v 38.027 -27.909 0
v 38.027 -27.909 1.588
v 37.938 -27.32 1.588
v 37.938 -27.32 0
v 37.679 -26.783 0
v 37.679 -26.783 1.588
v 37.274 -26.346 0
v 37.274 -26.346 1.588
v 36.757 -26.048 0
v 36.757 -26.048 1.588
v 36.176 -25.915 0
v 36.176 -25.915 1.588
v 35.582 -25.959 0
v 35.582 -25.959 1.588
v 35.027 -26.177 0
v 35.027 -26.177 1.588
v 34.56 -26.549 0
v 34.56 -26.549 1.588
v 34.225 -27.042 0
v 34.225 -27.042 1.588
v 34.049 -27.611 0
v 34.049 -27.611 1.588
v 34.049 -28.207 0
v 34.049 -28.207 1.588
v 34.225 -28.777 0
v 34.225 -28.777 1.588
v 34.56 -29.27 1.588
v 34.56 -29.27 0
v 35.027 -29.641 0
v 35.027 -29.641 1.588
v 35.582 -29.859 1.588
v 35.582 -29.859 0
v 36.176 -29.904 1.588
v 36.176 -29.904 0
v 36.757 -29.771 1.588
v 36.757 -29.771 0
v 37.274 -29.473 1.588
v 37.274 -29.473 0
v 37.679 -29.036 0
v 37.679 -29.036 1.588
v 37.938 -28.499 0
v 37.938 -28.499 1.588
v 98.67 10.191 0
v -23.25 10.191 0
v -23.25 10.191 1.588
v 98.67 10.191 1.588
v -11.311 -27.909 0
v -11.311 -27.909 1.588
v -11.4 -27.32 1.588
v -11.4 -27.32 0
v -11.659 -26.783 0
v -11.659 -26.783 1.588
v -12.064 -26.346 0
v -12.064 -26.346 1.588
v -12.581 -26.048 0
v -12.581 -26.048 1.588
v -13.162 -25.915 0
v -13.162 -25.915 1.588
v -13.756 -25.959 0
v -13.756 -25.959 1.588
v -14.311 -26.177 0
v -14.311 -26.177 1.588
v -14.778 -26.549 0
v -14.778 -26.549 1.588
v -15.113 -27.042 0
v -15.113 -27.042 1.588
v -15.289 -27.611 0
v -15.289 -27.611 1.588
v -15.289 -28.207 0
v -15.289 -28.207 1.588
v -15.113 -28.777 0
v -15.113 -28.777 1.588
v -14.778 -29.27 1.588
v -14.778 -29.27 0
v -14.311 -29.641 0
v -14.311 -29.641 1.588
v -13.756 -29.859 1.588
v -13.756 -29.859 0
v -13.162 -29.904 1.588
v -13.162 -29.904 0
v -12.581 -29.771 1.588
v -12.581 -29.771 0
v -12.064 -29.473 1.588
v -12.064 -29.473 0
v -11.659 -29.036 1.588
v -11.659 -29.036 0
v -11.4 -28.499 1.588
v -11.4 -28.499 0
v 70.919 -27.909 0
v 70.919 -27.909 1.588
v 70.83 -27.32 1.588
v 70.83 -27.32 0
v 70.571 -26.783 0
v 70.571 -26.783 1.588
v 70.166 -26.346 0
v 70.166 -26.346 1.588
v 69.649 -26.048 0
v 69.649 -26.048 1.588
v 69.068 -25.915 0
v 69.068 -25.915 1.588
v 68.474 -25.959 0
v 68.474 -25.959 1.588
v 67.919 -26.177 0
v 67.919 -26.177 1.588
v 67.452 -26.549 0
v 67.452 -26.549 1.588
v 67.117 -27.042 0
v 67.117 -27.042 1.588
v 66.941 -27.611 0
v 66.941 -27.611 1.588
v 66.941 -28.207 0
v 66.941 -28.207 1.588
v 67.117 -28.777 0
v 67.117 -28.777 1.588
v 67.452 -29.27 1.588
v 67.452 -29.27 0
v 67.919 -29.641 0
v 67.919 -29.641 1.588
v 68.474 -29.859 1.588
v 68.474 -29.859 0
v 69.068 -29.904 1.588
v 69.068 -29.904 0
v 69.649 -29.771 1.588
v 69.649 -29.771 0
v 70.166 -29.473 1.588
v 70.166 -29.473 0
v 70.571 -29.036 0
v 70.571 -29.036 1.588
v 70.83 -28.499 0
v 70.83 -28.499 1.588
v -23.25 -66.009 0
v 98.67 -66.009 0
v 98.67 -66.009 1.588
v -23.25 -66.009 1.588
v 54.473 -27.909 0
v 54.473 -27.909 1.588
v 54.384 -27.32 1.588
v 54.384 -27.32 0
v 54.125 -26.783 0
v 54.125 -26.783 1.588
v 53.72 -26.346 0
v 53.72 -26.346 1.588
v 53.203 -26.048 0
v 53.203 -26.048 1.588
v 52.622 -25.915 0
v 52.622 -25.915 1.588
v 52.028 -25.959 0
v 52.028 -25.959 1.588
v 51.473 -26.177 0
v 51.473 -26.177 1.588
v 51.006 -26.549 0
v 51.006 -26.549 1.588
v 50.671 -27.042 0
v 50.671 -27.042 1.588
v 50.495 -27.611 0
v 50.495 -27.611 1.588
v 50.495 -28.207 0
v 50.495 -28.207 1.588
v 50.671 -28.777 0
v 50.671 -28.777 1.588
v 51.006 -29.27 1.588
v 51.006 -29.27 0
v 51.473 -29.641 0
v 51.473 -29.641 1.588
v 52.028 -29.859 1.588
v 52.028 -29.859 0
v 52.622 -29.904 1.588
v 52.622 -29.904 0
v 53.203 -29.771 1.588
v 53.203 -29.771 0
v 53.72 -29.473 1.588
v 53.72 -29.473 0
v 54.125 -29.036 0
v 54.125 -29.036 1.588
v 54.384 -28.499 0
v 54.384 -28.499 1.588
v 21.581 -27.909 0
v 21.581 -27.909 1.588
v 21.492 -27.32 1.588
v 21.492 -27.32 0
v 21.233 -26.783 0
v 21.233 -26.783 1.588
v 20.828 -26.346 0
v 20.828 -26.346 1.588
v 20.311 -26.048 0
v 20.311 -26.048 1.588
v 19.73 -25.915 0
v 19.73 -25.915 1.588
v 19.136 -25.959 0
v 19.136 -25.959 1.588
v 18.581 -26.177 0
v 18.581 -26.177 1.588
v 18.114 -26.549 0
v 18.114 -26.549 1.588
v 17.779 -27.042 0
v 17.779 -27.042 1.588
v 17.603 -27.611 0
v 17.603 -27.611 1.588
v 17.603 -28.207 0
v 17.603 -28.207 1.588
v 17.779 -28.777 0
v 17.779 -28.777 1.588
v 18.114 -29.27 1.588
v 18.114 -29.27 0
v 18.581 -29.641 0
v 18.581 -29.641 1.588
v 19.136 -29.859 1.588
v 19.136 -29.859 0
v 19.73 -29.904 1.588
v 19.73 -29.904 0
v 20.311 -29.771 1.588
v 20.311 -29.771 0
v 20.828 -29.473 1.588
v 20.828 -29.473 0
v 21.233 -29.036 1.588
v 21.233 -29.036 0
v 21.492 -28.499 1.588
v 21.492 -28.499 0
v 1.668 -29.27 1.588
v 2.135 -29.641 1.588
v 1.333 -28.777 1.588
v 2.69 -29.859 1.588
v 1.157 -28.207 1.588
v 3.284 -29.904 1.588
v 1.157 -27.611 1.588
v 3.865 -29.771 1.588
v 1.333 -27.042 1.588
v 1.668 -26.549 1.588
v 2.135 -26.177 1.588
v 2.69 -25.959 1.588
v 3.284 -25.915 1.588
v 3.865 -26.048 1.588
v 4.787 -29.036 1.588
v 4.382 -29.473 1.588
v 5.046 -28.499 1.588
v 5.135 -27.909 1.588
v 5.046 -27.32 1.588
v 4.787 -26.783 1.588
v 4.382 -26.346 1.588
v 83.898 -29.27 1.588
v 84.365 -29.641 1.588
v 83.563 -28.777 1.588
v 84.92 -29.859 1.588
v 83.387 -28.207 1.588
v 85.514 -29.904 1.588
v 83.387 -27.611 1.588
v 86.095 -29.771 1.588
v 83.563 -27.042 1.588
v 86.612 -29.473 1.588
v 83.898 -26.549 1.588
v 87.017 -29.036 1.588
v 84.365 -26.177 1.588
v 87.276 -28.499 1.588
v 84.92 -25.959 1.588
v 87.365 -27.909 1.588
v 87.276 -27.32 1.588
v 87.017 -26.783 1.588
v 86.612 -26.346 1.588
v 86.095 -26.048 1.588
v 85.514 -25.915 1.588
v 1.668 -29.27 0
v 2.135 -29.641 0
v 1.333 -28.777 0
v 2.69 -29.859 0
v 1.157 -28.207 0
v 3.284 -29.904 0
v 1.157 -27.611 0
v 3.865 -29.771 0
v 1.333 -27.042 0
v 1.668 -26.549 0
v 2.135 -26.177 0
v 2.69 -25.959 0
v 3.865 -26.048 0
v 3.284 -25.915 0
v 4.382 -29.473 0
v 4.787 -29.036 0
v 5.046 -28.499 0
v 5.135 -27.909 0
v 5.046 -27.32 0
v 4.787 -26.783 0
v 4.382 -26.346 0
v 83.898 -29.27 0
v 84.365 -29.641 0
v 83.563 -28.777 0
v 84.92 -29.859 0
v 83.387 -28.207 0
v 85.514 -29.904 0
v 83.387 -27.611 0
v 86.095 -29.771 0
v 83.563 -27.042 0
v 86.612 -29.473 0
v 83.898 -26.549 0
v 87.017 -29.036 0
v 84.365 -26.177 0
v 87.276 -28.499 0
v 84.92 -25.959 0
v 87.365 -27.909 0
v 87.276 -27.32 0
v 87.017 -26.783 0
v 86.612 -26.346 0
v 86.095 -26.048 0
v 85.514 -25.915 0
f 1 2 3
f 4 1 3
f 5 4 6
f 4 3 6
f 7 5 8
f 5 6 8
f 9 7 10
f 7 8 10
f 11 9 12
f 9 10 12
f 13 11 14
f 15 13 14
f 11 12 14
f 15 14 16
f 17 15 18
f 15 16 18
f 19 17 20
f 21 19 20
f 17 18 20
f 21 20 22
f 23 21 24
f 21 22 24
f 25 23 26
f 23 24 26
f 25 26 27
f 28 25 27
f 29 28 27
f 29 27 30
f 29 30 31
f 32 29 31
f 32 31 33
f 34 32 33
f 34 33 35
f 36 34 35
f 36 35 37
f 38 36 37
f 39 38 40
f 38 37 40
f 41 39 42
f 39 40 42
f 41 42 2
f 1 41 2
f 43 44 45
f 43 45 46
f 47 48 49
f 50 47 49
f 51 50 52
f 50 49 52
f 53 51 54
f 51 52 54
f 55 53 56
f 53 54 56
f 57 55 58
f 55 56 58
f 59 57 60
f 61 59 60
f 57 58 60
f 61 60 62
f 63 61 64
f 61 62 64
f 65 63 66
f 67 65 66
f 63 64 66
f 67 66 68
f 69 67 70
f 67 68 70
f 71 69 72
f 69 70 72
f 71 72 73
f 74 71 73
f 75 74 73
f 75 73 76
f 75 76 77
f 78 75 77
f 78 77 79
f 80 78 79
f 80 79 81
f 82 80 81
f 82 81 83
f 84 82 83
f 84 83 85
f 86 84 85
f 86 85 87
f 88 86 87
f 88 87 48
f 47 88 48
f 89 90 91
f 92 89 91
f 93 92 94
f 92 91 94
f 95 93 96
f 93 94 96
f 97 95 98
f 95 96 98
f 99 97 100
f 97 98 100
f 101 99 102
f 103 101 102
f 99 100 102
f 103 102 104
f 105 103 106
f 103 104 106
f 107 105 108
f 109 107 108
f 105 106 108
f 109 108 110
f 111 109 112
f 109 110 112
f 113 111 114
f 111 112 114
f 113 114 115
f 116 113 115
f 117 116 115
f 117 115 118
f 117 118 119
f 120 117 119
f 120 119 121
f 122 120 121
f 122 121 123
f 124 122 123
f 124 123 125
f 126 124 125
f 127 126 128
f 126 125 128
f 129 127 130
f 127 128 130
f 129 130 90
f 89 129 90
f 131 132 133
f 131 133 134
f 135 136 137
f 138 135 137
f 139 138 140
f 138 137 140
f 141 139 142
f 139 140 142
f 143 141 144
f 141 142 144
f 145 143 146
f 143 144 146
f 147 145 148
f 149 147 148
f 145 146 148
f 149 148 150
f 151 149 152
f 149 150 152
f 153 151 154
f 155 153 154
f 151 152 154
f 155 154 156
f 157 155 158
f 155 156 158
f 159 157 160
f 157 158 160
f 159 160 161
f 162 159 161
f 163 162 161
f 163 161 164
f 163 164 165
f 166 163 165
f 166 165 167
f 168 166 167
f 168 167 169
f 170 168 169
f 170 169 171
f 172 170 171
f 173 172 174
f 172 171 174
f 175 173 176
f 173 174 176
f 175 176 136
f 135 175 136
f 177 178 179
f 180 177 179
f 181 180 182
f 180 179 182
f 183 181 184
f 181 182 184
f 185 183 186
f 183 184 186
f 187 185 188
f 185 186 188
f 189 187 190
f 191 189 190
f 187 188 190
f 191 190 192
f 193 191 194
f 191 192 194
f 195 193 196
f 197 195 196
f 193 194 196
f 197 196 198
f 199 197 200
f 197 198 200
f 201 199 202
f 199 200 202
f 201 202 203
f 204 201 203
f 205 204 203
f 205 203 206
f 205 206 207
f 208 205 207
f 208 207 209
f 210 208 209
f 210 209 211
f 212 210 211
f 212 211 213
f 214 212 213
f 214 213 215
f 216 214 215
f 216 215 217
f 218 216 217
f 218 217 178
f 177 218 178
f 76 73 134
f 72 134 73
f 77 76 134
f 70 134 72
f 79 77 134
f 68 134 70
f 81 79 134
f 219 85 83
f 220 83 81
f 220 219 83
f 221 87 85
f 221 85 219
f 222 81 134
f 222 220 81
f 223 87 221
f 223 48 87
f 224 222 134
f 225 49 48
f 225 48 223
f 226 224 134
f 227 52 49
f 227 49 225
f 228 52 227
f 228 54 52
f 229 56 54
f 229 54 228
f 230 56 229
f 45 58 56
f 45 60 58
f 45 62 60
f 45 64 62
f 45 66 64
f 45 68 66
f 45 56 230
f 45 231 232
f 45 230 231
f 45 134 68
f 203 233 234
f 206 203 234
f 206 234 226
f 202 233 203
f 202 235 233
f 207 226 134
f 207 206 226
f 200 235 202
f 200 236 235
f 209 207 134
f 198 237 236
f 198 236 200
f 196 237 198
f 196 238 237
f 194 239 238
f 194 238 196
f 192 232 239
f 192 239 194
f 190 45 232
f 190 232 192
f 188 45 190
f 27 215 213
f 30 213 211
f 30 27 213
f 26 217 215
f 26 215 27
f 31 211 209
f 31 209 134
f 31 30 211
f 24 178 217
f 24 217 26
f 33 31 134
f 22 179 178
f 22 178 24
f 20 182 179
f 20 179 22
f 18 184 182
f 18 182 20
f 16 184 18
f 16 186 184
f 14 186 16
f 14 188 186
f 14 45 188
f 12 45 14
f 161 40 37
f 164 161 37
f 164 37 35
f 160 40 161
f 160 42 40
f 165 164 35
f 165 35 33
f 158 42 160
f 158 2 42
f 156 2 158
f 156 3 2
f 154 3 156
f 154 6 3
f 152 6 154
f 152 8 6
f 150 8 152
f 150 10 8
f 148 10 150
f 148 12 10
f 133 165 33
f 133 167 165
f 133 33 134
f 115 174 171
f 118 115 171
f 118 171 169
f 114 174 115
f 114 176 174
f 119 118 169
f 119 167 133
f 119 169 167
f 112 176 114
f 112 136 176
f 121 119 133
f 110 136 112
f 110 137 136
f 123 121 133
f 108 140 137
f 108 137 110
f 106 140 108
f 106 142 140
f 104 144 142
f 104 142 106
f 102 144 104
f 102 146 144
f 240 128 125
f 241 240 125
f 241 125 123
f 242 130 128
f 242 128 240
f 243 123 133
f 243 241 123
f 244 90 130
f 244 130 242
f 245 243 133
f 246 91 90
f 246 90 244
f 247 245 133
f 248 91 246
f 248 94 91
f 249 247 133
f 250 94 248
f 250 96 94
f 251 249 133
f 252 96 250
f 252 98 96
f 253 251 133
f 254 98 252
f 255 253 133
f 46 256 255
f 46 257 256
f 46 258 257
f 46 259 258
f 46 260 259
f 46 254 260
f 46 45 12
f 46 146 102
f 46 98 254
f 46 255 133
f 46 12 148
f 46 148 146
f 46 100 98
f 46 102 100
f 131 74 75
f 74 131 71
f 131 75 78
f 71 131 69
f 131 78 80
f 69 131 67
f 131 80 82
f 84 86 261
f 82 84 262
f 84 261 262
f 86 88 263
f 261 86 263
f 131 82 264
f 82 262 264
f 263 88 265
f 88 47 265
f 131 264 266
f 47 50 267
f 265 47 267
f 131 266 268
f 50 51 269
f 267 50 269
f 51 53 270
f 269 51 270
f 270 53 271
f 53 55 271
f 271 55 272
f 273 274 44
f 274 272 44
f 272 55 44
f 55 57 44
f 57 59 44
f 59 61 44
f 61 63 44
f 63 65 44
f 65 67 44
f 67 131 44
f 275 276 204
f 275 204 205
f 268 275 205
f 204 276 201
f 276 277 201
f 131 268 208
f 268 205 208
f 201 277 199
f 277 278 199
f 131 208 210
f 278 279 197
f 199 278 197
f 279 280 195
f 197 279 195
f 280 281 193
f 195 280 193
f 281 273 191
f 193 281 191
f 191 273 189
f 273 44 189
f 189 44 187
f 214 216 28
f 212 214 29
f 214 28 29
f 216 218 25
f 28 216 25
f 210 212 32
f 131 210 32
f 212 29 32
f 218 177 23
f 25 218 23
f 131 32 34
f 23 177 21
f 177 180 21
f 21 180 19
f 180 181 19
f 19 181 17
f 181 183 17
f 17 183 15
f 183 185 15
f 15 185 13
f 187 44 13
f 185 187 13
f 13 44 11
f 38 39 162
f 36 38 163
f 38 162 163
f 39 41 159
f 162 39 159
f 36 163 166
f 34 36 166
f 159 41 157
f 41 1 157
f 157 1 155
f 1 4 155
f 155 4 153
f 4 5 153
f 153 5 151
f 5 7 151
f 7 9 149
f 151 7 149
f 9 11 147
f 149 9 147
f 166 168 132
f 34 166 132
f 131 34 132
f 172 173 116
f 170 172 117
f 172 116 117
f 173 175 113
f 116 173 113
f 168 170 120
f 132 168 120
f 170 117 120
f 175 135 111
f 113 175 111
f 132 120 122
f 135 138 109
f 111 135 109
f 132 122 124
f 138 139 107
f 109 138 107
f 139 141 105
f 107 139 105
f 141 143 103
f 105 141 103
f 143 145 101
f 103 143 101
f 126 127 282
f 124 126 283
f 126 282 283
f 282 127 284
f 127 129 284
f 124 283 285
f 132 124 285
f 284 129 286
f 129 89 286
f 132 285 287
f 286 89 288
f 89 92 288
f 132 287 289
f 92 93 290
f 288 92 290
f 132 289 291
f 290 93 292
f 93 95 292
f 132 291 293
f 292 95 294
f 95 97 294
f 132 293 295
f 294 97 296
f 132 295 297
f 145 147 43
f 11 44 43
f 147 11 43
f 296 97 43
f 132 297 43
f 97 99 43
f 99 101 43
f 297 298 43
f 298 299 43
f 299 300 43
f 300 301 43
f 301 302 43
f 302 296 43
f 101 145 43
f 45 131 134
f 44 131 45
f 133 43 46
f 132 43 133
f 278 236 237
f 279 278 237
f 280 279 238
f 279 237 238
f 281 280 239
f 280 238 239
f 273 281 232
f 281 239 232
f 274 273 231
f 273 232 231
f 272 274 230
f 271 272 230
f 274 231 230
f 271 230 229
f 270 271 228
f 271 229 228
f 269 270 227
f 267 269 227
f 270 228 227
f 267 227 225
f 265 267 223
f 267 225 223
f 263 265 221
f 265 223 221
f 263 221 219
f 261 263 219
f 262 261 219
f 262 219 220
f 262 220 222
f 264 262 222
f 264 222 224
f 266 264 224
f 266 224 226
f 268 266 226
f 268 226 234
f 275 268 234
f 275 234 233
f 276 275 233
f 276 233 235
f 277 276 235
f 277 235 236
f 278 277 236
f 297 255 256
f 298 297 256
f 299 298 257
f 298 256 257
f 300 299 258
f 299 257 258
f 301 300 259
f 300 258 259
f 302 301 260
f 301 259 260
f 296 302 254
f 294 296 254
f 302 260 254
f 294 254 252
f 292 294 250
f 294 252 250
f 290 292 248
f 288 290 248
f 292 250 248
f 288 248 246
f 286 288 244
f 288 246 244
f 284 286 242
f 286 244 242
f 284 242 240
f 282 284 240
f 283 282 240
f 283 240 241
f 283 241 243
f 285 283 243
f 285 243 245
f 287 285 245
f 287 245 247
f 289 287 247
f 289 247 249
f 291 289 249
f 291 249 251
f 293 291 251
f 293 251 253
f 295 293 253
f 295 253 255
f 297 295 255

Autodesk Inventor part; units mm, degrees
ref_plane "YZ Plane" through (0, 0, 0) normal (1, 0, 0) x (0, 1, 0)
ref_plane "XZ Plane" through (0, 0, 0) normal (0, 1, 0) x (-1, 0, 0)
ref_plane "XY Plane" through (0, 0, 0) normal (0, 0, 1) x (1, 0, 0)
sketch "Sketch1" plane through (0, 0, 0) normal (0, 0, 1) x (1, 0, 0)
  line L0 (-23.2495, 10.1907) -> (98.6705, 10.1907)
  line L1 (98.6705, 10.1907) -> (98.6705, -66.0093)
  line L2 (98.6705, -66.0093) -> (-23.2495, -66.0093)
  line L3 (-23.2495, -66.0093) -> (-23.2495, 10.1907)
  point P0 (0, 0)
  dimension "d0" = 121.92
  dimension "d1" = 76.2
extrude "Extrusion1" add sketch "Sketch1" along normal blind 1.5875
sketch "Sketch2" plane through (0, 0, 1.5875) normal (0, 0, 1) x (1, 0, 0)
  circle A0 centre (-13.3114, -27.9093) radius 2
  circle A1 centre (3.1346, -27.9093) radius 2
  circle A2 centre (19.5806, -27.9093) radius 2
  circle A3 centre (36.0266, -27.9093) radius 2
  circle A4 centre (68.9186, -27.9093) radius 2
  circle A5 centre (85.3646, -27.9093) radius 2
  line L0 (98.6705, -66.0093) -> (98.6705, 10.1907) projected
  line L1 (68.9186, -27.9093) -> (51.2881, -27.9093) construction
  circle A6 centre (52.4726, -27.9093) radius 2
  point P0 (0, 0)
  dimension "d4" = 4
  dimension "d5" = 4
  dimension "d6" = 4
  dimension "d7" = 4
  dimension "d9" = 4
  dimension "d10" = 4
  dimension "d11" = 12.446
  dimension "d12" = 12.446
  dimension "d13" = 12.446
  dimension "d18" = 4
  dimension "d20" = 12.446
  dimension "d21" = 12.446
  dimension "d22" = 12.446
extrude "Extrusion2" cut sketch "Sketch2" against normal blind 1.5875
properties part number "topgearbase"
